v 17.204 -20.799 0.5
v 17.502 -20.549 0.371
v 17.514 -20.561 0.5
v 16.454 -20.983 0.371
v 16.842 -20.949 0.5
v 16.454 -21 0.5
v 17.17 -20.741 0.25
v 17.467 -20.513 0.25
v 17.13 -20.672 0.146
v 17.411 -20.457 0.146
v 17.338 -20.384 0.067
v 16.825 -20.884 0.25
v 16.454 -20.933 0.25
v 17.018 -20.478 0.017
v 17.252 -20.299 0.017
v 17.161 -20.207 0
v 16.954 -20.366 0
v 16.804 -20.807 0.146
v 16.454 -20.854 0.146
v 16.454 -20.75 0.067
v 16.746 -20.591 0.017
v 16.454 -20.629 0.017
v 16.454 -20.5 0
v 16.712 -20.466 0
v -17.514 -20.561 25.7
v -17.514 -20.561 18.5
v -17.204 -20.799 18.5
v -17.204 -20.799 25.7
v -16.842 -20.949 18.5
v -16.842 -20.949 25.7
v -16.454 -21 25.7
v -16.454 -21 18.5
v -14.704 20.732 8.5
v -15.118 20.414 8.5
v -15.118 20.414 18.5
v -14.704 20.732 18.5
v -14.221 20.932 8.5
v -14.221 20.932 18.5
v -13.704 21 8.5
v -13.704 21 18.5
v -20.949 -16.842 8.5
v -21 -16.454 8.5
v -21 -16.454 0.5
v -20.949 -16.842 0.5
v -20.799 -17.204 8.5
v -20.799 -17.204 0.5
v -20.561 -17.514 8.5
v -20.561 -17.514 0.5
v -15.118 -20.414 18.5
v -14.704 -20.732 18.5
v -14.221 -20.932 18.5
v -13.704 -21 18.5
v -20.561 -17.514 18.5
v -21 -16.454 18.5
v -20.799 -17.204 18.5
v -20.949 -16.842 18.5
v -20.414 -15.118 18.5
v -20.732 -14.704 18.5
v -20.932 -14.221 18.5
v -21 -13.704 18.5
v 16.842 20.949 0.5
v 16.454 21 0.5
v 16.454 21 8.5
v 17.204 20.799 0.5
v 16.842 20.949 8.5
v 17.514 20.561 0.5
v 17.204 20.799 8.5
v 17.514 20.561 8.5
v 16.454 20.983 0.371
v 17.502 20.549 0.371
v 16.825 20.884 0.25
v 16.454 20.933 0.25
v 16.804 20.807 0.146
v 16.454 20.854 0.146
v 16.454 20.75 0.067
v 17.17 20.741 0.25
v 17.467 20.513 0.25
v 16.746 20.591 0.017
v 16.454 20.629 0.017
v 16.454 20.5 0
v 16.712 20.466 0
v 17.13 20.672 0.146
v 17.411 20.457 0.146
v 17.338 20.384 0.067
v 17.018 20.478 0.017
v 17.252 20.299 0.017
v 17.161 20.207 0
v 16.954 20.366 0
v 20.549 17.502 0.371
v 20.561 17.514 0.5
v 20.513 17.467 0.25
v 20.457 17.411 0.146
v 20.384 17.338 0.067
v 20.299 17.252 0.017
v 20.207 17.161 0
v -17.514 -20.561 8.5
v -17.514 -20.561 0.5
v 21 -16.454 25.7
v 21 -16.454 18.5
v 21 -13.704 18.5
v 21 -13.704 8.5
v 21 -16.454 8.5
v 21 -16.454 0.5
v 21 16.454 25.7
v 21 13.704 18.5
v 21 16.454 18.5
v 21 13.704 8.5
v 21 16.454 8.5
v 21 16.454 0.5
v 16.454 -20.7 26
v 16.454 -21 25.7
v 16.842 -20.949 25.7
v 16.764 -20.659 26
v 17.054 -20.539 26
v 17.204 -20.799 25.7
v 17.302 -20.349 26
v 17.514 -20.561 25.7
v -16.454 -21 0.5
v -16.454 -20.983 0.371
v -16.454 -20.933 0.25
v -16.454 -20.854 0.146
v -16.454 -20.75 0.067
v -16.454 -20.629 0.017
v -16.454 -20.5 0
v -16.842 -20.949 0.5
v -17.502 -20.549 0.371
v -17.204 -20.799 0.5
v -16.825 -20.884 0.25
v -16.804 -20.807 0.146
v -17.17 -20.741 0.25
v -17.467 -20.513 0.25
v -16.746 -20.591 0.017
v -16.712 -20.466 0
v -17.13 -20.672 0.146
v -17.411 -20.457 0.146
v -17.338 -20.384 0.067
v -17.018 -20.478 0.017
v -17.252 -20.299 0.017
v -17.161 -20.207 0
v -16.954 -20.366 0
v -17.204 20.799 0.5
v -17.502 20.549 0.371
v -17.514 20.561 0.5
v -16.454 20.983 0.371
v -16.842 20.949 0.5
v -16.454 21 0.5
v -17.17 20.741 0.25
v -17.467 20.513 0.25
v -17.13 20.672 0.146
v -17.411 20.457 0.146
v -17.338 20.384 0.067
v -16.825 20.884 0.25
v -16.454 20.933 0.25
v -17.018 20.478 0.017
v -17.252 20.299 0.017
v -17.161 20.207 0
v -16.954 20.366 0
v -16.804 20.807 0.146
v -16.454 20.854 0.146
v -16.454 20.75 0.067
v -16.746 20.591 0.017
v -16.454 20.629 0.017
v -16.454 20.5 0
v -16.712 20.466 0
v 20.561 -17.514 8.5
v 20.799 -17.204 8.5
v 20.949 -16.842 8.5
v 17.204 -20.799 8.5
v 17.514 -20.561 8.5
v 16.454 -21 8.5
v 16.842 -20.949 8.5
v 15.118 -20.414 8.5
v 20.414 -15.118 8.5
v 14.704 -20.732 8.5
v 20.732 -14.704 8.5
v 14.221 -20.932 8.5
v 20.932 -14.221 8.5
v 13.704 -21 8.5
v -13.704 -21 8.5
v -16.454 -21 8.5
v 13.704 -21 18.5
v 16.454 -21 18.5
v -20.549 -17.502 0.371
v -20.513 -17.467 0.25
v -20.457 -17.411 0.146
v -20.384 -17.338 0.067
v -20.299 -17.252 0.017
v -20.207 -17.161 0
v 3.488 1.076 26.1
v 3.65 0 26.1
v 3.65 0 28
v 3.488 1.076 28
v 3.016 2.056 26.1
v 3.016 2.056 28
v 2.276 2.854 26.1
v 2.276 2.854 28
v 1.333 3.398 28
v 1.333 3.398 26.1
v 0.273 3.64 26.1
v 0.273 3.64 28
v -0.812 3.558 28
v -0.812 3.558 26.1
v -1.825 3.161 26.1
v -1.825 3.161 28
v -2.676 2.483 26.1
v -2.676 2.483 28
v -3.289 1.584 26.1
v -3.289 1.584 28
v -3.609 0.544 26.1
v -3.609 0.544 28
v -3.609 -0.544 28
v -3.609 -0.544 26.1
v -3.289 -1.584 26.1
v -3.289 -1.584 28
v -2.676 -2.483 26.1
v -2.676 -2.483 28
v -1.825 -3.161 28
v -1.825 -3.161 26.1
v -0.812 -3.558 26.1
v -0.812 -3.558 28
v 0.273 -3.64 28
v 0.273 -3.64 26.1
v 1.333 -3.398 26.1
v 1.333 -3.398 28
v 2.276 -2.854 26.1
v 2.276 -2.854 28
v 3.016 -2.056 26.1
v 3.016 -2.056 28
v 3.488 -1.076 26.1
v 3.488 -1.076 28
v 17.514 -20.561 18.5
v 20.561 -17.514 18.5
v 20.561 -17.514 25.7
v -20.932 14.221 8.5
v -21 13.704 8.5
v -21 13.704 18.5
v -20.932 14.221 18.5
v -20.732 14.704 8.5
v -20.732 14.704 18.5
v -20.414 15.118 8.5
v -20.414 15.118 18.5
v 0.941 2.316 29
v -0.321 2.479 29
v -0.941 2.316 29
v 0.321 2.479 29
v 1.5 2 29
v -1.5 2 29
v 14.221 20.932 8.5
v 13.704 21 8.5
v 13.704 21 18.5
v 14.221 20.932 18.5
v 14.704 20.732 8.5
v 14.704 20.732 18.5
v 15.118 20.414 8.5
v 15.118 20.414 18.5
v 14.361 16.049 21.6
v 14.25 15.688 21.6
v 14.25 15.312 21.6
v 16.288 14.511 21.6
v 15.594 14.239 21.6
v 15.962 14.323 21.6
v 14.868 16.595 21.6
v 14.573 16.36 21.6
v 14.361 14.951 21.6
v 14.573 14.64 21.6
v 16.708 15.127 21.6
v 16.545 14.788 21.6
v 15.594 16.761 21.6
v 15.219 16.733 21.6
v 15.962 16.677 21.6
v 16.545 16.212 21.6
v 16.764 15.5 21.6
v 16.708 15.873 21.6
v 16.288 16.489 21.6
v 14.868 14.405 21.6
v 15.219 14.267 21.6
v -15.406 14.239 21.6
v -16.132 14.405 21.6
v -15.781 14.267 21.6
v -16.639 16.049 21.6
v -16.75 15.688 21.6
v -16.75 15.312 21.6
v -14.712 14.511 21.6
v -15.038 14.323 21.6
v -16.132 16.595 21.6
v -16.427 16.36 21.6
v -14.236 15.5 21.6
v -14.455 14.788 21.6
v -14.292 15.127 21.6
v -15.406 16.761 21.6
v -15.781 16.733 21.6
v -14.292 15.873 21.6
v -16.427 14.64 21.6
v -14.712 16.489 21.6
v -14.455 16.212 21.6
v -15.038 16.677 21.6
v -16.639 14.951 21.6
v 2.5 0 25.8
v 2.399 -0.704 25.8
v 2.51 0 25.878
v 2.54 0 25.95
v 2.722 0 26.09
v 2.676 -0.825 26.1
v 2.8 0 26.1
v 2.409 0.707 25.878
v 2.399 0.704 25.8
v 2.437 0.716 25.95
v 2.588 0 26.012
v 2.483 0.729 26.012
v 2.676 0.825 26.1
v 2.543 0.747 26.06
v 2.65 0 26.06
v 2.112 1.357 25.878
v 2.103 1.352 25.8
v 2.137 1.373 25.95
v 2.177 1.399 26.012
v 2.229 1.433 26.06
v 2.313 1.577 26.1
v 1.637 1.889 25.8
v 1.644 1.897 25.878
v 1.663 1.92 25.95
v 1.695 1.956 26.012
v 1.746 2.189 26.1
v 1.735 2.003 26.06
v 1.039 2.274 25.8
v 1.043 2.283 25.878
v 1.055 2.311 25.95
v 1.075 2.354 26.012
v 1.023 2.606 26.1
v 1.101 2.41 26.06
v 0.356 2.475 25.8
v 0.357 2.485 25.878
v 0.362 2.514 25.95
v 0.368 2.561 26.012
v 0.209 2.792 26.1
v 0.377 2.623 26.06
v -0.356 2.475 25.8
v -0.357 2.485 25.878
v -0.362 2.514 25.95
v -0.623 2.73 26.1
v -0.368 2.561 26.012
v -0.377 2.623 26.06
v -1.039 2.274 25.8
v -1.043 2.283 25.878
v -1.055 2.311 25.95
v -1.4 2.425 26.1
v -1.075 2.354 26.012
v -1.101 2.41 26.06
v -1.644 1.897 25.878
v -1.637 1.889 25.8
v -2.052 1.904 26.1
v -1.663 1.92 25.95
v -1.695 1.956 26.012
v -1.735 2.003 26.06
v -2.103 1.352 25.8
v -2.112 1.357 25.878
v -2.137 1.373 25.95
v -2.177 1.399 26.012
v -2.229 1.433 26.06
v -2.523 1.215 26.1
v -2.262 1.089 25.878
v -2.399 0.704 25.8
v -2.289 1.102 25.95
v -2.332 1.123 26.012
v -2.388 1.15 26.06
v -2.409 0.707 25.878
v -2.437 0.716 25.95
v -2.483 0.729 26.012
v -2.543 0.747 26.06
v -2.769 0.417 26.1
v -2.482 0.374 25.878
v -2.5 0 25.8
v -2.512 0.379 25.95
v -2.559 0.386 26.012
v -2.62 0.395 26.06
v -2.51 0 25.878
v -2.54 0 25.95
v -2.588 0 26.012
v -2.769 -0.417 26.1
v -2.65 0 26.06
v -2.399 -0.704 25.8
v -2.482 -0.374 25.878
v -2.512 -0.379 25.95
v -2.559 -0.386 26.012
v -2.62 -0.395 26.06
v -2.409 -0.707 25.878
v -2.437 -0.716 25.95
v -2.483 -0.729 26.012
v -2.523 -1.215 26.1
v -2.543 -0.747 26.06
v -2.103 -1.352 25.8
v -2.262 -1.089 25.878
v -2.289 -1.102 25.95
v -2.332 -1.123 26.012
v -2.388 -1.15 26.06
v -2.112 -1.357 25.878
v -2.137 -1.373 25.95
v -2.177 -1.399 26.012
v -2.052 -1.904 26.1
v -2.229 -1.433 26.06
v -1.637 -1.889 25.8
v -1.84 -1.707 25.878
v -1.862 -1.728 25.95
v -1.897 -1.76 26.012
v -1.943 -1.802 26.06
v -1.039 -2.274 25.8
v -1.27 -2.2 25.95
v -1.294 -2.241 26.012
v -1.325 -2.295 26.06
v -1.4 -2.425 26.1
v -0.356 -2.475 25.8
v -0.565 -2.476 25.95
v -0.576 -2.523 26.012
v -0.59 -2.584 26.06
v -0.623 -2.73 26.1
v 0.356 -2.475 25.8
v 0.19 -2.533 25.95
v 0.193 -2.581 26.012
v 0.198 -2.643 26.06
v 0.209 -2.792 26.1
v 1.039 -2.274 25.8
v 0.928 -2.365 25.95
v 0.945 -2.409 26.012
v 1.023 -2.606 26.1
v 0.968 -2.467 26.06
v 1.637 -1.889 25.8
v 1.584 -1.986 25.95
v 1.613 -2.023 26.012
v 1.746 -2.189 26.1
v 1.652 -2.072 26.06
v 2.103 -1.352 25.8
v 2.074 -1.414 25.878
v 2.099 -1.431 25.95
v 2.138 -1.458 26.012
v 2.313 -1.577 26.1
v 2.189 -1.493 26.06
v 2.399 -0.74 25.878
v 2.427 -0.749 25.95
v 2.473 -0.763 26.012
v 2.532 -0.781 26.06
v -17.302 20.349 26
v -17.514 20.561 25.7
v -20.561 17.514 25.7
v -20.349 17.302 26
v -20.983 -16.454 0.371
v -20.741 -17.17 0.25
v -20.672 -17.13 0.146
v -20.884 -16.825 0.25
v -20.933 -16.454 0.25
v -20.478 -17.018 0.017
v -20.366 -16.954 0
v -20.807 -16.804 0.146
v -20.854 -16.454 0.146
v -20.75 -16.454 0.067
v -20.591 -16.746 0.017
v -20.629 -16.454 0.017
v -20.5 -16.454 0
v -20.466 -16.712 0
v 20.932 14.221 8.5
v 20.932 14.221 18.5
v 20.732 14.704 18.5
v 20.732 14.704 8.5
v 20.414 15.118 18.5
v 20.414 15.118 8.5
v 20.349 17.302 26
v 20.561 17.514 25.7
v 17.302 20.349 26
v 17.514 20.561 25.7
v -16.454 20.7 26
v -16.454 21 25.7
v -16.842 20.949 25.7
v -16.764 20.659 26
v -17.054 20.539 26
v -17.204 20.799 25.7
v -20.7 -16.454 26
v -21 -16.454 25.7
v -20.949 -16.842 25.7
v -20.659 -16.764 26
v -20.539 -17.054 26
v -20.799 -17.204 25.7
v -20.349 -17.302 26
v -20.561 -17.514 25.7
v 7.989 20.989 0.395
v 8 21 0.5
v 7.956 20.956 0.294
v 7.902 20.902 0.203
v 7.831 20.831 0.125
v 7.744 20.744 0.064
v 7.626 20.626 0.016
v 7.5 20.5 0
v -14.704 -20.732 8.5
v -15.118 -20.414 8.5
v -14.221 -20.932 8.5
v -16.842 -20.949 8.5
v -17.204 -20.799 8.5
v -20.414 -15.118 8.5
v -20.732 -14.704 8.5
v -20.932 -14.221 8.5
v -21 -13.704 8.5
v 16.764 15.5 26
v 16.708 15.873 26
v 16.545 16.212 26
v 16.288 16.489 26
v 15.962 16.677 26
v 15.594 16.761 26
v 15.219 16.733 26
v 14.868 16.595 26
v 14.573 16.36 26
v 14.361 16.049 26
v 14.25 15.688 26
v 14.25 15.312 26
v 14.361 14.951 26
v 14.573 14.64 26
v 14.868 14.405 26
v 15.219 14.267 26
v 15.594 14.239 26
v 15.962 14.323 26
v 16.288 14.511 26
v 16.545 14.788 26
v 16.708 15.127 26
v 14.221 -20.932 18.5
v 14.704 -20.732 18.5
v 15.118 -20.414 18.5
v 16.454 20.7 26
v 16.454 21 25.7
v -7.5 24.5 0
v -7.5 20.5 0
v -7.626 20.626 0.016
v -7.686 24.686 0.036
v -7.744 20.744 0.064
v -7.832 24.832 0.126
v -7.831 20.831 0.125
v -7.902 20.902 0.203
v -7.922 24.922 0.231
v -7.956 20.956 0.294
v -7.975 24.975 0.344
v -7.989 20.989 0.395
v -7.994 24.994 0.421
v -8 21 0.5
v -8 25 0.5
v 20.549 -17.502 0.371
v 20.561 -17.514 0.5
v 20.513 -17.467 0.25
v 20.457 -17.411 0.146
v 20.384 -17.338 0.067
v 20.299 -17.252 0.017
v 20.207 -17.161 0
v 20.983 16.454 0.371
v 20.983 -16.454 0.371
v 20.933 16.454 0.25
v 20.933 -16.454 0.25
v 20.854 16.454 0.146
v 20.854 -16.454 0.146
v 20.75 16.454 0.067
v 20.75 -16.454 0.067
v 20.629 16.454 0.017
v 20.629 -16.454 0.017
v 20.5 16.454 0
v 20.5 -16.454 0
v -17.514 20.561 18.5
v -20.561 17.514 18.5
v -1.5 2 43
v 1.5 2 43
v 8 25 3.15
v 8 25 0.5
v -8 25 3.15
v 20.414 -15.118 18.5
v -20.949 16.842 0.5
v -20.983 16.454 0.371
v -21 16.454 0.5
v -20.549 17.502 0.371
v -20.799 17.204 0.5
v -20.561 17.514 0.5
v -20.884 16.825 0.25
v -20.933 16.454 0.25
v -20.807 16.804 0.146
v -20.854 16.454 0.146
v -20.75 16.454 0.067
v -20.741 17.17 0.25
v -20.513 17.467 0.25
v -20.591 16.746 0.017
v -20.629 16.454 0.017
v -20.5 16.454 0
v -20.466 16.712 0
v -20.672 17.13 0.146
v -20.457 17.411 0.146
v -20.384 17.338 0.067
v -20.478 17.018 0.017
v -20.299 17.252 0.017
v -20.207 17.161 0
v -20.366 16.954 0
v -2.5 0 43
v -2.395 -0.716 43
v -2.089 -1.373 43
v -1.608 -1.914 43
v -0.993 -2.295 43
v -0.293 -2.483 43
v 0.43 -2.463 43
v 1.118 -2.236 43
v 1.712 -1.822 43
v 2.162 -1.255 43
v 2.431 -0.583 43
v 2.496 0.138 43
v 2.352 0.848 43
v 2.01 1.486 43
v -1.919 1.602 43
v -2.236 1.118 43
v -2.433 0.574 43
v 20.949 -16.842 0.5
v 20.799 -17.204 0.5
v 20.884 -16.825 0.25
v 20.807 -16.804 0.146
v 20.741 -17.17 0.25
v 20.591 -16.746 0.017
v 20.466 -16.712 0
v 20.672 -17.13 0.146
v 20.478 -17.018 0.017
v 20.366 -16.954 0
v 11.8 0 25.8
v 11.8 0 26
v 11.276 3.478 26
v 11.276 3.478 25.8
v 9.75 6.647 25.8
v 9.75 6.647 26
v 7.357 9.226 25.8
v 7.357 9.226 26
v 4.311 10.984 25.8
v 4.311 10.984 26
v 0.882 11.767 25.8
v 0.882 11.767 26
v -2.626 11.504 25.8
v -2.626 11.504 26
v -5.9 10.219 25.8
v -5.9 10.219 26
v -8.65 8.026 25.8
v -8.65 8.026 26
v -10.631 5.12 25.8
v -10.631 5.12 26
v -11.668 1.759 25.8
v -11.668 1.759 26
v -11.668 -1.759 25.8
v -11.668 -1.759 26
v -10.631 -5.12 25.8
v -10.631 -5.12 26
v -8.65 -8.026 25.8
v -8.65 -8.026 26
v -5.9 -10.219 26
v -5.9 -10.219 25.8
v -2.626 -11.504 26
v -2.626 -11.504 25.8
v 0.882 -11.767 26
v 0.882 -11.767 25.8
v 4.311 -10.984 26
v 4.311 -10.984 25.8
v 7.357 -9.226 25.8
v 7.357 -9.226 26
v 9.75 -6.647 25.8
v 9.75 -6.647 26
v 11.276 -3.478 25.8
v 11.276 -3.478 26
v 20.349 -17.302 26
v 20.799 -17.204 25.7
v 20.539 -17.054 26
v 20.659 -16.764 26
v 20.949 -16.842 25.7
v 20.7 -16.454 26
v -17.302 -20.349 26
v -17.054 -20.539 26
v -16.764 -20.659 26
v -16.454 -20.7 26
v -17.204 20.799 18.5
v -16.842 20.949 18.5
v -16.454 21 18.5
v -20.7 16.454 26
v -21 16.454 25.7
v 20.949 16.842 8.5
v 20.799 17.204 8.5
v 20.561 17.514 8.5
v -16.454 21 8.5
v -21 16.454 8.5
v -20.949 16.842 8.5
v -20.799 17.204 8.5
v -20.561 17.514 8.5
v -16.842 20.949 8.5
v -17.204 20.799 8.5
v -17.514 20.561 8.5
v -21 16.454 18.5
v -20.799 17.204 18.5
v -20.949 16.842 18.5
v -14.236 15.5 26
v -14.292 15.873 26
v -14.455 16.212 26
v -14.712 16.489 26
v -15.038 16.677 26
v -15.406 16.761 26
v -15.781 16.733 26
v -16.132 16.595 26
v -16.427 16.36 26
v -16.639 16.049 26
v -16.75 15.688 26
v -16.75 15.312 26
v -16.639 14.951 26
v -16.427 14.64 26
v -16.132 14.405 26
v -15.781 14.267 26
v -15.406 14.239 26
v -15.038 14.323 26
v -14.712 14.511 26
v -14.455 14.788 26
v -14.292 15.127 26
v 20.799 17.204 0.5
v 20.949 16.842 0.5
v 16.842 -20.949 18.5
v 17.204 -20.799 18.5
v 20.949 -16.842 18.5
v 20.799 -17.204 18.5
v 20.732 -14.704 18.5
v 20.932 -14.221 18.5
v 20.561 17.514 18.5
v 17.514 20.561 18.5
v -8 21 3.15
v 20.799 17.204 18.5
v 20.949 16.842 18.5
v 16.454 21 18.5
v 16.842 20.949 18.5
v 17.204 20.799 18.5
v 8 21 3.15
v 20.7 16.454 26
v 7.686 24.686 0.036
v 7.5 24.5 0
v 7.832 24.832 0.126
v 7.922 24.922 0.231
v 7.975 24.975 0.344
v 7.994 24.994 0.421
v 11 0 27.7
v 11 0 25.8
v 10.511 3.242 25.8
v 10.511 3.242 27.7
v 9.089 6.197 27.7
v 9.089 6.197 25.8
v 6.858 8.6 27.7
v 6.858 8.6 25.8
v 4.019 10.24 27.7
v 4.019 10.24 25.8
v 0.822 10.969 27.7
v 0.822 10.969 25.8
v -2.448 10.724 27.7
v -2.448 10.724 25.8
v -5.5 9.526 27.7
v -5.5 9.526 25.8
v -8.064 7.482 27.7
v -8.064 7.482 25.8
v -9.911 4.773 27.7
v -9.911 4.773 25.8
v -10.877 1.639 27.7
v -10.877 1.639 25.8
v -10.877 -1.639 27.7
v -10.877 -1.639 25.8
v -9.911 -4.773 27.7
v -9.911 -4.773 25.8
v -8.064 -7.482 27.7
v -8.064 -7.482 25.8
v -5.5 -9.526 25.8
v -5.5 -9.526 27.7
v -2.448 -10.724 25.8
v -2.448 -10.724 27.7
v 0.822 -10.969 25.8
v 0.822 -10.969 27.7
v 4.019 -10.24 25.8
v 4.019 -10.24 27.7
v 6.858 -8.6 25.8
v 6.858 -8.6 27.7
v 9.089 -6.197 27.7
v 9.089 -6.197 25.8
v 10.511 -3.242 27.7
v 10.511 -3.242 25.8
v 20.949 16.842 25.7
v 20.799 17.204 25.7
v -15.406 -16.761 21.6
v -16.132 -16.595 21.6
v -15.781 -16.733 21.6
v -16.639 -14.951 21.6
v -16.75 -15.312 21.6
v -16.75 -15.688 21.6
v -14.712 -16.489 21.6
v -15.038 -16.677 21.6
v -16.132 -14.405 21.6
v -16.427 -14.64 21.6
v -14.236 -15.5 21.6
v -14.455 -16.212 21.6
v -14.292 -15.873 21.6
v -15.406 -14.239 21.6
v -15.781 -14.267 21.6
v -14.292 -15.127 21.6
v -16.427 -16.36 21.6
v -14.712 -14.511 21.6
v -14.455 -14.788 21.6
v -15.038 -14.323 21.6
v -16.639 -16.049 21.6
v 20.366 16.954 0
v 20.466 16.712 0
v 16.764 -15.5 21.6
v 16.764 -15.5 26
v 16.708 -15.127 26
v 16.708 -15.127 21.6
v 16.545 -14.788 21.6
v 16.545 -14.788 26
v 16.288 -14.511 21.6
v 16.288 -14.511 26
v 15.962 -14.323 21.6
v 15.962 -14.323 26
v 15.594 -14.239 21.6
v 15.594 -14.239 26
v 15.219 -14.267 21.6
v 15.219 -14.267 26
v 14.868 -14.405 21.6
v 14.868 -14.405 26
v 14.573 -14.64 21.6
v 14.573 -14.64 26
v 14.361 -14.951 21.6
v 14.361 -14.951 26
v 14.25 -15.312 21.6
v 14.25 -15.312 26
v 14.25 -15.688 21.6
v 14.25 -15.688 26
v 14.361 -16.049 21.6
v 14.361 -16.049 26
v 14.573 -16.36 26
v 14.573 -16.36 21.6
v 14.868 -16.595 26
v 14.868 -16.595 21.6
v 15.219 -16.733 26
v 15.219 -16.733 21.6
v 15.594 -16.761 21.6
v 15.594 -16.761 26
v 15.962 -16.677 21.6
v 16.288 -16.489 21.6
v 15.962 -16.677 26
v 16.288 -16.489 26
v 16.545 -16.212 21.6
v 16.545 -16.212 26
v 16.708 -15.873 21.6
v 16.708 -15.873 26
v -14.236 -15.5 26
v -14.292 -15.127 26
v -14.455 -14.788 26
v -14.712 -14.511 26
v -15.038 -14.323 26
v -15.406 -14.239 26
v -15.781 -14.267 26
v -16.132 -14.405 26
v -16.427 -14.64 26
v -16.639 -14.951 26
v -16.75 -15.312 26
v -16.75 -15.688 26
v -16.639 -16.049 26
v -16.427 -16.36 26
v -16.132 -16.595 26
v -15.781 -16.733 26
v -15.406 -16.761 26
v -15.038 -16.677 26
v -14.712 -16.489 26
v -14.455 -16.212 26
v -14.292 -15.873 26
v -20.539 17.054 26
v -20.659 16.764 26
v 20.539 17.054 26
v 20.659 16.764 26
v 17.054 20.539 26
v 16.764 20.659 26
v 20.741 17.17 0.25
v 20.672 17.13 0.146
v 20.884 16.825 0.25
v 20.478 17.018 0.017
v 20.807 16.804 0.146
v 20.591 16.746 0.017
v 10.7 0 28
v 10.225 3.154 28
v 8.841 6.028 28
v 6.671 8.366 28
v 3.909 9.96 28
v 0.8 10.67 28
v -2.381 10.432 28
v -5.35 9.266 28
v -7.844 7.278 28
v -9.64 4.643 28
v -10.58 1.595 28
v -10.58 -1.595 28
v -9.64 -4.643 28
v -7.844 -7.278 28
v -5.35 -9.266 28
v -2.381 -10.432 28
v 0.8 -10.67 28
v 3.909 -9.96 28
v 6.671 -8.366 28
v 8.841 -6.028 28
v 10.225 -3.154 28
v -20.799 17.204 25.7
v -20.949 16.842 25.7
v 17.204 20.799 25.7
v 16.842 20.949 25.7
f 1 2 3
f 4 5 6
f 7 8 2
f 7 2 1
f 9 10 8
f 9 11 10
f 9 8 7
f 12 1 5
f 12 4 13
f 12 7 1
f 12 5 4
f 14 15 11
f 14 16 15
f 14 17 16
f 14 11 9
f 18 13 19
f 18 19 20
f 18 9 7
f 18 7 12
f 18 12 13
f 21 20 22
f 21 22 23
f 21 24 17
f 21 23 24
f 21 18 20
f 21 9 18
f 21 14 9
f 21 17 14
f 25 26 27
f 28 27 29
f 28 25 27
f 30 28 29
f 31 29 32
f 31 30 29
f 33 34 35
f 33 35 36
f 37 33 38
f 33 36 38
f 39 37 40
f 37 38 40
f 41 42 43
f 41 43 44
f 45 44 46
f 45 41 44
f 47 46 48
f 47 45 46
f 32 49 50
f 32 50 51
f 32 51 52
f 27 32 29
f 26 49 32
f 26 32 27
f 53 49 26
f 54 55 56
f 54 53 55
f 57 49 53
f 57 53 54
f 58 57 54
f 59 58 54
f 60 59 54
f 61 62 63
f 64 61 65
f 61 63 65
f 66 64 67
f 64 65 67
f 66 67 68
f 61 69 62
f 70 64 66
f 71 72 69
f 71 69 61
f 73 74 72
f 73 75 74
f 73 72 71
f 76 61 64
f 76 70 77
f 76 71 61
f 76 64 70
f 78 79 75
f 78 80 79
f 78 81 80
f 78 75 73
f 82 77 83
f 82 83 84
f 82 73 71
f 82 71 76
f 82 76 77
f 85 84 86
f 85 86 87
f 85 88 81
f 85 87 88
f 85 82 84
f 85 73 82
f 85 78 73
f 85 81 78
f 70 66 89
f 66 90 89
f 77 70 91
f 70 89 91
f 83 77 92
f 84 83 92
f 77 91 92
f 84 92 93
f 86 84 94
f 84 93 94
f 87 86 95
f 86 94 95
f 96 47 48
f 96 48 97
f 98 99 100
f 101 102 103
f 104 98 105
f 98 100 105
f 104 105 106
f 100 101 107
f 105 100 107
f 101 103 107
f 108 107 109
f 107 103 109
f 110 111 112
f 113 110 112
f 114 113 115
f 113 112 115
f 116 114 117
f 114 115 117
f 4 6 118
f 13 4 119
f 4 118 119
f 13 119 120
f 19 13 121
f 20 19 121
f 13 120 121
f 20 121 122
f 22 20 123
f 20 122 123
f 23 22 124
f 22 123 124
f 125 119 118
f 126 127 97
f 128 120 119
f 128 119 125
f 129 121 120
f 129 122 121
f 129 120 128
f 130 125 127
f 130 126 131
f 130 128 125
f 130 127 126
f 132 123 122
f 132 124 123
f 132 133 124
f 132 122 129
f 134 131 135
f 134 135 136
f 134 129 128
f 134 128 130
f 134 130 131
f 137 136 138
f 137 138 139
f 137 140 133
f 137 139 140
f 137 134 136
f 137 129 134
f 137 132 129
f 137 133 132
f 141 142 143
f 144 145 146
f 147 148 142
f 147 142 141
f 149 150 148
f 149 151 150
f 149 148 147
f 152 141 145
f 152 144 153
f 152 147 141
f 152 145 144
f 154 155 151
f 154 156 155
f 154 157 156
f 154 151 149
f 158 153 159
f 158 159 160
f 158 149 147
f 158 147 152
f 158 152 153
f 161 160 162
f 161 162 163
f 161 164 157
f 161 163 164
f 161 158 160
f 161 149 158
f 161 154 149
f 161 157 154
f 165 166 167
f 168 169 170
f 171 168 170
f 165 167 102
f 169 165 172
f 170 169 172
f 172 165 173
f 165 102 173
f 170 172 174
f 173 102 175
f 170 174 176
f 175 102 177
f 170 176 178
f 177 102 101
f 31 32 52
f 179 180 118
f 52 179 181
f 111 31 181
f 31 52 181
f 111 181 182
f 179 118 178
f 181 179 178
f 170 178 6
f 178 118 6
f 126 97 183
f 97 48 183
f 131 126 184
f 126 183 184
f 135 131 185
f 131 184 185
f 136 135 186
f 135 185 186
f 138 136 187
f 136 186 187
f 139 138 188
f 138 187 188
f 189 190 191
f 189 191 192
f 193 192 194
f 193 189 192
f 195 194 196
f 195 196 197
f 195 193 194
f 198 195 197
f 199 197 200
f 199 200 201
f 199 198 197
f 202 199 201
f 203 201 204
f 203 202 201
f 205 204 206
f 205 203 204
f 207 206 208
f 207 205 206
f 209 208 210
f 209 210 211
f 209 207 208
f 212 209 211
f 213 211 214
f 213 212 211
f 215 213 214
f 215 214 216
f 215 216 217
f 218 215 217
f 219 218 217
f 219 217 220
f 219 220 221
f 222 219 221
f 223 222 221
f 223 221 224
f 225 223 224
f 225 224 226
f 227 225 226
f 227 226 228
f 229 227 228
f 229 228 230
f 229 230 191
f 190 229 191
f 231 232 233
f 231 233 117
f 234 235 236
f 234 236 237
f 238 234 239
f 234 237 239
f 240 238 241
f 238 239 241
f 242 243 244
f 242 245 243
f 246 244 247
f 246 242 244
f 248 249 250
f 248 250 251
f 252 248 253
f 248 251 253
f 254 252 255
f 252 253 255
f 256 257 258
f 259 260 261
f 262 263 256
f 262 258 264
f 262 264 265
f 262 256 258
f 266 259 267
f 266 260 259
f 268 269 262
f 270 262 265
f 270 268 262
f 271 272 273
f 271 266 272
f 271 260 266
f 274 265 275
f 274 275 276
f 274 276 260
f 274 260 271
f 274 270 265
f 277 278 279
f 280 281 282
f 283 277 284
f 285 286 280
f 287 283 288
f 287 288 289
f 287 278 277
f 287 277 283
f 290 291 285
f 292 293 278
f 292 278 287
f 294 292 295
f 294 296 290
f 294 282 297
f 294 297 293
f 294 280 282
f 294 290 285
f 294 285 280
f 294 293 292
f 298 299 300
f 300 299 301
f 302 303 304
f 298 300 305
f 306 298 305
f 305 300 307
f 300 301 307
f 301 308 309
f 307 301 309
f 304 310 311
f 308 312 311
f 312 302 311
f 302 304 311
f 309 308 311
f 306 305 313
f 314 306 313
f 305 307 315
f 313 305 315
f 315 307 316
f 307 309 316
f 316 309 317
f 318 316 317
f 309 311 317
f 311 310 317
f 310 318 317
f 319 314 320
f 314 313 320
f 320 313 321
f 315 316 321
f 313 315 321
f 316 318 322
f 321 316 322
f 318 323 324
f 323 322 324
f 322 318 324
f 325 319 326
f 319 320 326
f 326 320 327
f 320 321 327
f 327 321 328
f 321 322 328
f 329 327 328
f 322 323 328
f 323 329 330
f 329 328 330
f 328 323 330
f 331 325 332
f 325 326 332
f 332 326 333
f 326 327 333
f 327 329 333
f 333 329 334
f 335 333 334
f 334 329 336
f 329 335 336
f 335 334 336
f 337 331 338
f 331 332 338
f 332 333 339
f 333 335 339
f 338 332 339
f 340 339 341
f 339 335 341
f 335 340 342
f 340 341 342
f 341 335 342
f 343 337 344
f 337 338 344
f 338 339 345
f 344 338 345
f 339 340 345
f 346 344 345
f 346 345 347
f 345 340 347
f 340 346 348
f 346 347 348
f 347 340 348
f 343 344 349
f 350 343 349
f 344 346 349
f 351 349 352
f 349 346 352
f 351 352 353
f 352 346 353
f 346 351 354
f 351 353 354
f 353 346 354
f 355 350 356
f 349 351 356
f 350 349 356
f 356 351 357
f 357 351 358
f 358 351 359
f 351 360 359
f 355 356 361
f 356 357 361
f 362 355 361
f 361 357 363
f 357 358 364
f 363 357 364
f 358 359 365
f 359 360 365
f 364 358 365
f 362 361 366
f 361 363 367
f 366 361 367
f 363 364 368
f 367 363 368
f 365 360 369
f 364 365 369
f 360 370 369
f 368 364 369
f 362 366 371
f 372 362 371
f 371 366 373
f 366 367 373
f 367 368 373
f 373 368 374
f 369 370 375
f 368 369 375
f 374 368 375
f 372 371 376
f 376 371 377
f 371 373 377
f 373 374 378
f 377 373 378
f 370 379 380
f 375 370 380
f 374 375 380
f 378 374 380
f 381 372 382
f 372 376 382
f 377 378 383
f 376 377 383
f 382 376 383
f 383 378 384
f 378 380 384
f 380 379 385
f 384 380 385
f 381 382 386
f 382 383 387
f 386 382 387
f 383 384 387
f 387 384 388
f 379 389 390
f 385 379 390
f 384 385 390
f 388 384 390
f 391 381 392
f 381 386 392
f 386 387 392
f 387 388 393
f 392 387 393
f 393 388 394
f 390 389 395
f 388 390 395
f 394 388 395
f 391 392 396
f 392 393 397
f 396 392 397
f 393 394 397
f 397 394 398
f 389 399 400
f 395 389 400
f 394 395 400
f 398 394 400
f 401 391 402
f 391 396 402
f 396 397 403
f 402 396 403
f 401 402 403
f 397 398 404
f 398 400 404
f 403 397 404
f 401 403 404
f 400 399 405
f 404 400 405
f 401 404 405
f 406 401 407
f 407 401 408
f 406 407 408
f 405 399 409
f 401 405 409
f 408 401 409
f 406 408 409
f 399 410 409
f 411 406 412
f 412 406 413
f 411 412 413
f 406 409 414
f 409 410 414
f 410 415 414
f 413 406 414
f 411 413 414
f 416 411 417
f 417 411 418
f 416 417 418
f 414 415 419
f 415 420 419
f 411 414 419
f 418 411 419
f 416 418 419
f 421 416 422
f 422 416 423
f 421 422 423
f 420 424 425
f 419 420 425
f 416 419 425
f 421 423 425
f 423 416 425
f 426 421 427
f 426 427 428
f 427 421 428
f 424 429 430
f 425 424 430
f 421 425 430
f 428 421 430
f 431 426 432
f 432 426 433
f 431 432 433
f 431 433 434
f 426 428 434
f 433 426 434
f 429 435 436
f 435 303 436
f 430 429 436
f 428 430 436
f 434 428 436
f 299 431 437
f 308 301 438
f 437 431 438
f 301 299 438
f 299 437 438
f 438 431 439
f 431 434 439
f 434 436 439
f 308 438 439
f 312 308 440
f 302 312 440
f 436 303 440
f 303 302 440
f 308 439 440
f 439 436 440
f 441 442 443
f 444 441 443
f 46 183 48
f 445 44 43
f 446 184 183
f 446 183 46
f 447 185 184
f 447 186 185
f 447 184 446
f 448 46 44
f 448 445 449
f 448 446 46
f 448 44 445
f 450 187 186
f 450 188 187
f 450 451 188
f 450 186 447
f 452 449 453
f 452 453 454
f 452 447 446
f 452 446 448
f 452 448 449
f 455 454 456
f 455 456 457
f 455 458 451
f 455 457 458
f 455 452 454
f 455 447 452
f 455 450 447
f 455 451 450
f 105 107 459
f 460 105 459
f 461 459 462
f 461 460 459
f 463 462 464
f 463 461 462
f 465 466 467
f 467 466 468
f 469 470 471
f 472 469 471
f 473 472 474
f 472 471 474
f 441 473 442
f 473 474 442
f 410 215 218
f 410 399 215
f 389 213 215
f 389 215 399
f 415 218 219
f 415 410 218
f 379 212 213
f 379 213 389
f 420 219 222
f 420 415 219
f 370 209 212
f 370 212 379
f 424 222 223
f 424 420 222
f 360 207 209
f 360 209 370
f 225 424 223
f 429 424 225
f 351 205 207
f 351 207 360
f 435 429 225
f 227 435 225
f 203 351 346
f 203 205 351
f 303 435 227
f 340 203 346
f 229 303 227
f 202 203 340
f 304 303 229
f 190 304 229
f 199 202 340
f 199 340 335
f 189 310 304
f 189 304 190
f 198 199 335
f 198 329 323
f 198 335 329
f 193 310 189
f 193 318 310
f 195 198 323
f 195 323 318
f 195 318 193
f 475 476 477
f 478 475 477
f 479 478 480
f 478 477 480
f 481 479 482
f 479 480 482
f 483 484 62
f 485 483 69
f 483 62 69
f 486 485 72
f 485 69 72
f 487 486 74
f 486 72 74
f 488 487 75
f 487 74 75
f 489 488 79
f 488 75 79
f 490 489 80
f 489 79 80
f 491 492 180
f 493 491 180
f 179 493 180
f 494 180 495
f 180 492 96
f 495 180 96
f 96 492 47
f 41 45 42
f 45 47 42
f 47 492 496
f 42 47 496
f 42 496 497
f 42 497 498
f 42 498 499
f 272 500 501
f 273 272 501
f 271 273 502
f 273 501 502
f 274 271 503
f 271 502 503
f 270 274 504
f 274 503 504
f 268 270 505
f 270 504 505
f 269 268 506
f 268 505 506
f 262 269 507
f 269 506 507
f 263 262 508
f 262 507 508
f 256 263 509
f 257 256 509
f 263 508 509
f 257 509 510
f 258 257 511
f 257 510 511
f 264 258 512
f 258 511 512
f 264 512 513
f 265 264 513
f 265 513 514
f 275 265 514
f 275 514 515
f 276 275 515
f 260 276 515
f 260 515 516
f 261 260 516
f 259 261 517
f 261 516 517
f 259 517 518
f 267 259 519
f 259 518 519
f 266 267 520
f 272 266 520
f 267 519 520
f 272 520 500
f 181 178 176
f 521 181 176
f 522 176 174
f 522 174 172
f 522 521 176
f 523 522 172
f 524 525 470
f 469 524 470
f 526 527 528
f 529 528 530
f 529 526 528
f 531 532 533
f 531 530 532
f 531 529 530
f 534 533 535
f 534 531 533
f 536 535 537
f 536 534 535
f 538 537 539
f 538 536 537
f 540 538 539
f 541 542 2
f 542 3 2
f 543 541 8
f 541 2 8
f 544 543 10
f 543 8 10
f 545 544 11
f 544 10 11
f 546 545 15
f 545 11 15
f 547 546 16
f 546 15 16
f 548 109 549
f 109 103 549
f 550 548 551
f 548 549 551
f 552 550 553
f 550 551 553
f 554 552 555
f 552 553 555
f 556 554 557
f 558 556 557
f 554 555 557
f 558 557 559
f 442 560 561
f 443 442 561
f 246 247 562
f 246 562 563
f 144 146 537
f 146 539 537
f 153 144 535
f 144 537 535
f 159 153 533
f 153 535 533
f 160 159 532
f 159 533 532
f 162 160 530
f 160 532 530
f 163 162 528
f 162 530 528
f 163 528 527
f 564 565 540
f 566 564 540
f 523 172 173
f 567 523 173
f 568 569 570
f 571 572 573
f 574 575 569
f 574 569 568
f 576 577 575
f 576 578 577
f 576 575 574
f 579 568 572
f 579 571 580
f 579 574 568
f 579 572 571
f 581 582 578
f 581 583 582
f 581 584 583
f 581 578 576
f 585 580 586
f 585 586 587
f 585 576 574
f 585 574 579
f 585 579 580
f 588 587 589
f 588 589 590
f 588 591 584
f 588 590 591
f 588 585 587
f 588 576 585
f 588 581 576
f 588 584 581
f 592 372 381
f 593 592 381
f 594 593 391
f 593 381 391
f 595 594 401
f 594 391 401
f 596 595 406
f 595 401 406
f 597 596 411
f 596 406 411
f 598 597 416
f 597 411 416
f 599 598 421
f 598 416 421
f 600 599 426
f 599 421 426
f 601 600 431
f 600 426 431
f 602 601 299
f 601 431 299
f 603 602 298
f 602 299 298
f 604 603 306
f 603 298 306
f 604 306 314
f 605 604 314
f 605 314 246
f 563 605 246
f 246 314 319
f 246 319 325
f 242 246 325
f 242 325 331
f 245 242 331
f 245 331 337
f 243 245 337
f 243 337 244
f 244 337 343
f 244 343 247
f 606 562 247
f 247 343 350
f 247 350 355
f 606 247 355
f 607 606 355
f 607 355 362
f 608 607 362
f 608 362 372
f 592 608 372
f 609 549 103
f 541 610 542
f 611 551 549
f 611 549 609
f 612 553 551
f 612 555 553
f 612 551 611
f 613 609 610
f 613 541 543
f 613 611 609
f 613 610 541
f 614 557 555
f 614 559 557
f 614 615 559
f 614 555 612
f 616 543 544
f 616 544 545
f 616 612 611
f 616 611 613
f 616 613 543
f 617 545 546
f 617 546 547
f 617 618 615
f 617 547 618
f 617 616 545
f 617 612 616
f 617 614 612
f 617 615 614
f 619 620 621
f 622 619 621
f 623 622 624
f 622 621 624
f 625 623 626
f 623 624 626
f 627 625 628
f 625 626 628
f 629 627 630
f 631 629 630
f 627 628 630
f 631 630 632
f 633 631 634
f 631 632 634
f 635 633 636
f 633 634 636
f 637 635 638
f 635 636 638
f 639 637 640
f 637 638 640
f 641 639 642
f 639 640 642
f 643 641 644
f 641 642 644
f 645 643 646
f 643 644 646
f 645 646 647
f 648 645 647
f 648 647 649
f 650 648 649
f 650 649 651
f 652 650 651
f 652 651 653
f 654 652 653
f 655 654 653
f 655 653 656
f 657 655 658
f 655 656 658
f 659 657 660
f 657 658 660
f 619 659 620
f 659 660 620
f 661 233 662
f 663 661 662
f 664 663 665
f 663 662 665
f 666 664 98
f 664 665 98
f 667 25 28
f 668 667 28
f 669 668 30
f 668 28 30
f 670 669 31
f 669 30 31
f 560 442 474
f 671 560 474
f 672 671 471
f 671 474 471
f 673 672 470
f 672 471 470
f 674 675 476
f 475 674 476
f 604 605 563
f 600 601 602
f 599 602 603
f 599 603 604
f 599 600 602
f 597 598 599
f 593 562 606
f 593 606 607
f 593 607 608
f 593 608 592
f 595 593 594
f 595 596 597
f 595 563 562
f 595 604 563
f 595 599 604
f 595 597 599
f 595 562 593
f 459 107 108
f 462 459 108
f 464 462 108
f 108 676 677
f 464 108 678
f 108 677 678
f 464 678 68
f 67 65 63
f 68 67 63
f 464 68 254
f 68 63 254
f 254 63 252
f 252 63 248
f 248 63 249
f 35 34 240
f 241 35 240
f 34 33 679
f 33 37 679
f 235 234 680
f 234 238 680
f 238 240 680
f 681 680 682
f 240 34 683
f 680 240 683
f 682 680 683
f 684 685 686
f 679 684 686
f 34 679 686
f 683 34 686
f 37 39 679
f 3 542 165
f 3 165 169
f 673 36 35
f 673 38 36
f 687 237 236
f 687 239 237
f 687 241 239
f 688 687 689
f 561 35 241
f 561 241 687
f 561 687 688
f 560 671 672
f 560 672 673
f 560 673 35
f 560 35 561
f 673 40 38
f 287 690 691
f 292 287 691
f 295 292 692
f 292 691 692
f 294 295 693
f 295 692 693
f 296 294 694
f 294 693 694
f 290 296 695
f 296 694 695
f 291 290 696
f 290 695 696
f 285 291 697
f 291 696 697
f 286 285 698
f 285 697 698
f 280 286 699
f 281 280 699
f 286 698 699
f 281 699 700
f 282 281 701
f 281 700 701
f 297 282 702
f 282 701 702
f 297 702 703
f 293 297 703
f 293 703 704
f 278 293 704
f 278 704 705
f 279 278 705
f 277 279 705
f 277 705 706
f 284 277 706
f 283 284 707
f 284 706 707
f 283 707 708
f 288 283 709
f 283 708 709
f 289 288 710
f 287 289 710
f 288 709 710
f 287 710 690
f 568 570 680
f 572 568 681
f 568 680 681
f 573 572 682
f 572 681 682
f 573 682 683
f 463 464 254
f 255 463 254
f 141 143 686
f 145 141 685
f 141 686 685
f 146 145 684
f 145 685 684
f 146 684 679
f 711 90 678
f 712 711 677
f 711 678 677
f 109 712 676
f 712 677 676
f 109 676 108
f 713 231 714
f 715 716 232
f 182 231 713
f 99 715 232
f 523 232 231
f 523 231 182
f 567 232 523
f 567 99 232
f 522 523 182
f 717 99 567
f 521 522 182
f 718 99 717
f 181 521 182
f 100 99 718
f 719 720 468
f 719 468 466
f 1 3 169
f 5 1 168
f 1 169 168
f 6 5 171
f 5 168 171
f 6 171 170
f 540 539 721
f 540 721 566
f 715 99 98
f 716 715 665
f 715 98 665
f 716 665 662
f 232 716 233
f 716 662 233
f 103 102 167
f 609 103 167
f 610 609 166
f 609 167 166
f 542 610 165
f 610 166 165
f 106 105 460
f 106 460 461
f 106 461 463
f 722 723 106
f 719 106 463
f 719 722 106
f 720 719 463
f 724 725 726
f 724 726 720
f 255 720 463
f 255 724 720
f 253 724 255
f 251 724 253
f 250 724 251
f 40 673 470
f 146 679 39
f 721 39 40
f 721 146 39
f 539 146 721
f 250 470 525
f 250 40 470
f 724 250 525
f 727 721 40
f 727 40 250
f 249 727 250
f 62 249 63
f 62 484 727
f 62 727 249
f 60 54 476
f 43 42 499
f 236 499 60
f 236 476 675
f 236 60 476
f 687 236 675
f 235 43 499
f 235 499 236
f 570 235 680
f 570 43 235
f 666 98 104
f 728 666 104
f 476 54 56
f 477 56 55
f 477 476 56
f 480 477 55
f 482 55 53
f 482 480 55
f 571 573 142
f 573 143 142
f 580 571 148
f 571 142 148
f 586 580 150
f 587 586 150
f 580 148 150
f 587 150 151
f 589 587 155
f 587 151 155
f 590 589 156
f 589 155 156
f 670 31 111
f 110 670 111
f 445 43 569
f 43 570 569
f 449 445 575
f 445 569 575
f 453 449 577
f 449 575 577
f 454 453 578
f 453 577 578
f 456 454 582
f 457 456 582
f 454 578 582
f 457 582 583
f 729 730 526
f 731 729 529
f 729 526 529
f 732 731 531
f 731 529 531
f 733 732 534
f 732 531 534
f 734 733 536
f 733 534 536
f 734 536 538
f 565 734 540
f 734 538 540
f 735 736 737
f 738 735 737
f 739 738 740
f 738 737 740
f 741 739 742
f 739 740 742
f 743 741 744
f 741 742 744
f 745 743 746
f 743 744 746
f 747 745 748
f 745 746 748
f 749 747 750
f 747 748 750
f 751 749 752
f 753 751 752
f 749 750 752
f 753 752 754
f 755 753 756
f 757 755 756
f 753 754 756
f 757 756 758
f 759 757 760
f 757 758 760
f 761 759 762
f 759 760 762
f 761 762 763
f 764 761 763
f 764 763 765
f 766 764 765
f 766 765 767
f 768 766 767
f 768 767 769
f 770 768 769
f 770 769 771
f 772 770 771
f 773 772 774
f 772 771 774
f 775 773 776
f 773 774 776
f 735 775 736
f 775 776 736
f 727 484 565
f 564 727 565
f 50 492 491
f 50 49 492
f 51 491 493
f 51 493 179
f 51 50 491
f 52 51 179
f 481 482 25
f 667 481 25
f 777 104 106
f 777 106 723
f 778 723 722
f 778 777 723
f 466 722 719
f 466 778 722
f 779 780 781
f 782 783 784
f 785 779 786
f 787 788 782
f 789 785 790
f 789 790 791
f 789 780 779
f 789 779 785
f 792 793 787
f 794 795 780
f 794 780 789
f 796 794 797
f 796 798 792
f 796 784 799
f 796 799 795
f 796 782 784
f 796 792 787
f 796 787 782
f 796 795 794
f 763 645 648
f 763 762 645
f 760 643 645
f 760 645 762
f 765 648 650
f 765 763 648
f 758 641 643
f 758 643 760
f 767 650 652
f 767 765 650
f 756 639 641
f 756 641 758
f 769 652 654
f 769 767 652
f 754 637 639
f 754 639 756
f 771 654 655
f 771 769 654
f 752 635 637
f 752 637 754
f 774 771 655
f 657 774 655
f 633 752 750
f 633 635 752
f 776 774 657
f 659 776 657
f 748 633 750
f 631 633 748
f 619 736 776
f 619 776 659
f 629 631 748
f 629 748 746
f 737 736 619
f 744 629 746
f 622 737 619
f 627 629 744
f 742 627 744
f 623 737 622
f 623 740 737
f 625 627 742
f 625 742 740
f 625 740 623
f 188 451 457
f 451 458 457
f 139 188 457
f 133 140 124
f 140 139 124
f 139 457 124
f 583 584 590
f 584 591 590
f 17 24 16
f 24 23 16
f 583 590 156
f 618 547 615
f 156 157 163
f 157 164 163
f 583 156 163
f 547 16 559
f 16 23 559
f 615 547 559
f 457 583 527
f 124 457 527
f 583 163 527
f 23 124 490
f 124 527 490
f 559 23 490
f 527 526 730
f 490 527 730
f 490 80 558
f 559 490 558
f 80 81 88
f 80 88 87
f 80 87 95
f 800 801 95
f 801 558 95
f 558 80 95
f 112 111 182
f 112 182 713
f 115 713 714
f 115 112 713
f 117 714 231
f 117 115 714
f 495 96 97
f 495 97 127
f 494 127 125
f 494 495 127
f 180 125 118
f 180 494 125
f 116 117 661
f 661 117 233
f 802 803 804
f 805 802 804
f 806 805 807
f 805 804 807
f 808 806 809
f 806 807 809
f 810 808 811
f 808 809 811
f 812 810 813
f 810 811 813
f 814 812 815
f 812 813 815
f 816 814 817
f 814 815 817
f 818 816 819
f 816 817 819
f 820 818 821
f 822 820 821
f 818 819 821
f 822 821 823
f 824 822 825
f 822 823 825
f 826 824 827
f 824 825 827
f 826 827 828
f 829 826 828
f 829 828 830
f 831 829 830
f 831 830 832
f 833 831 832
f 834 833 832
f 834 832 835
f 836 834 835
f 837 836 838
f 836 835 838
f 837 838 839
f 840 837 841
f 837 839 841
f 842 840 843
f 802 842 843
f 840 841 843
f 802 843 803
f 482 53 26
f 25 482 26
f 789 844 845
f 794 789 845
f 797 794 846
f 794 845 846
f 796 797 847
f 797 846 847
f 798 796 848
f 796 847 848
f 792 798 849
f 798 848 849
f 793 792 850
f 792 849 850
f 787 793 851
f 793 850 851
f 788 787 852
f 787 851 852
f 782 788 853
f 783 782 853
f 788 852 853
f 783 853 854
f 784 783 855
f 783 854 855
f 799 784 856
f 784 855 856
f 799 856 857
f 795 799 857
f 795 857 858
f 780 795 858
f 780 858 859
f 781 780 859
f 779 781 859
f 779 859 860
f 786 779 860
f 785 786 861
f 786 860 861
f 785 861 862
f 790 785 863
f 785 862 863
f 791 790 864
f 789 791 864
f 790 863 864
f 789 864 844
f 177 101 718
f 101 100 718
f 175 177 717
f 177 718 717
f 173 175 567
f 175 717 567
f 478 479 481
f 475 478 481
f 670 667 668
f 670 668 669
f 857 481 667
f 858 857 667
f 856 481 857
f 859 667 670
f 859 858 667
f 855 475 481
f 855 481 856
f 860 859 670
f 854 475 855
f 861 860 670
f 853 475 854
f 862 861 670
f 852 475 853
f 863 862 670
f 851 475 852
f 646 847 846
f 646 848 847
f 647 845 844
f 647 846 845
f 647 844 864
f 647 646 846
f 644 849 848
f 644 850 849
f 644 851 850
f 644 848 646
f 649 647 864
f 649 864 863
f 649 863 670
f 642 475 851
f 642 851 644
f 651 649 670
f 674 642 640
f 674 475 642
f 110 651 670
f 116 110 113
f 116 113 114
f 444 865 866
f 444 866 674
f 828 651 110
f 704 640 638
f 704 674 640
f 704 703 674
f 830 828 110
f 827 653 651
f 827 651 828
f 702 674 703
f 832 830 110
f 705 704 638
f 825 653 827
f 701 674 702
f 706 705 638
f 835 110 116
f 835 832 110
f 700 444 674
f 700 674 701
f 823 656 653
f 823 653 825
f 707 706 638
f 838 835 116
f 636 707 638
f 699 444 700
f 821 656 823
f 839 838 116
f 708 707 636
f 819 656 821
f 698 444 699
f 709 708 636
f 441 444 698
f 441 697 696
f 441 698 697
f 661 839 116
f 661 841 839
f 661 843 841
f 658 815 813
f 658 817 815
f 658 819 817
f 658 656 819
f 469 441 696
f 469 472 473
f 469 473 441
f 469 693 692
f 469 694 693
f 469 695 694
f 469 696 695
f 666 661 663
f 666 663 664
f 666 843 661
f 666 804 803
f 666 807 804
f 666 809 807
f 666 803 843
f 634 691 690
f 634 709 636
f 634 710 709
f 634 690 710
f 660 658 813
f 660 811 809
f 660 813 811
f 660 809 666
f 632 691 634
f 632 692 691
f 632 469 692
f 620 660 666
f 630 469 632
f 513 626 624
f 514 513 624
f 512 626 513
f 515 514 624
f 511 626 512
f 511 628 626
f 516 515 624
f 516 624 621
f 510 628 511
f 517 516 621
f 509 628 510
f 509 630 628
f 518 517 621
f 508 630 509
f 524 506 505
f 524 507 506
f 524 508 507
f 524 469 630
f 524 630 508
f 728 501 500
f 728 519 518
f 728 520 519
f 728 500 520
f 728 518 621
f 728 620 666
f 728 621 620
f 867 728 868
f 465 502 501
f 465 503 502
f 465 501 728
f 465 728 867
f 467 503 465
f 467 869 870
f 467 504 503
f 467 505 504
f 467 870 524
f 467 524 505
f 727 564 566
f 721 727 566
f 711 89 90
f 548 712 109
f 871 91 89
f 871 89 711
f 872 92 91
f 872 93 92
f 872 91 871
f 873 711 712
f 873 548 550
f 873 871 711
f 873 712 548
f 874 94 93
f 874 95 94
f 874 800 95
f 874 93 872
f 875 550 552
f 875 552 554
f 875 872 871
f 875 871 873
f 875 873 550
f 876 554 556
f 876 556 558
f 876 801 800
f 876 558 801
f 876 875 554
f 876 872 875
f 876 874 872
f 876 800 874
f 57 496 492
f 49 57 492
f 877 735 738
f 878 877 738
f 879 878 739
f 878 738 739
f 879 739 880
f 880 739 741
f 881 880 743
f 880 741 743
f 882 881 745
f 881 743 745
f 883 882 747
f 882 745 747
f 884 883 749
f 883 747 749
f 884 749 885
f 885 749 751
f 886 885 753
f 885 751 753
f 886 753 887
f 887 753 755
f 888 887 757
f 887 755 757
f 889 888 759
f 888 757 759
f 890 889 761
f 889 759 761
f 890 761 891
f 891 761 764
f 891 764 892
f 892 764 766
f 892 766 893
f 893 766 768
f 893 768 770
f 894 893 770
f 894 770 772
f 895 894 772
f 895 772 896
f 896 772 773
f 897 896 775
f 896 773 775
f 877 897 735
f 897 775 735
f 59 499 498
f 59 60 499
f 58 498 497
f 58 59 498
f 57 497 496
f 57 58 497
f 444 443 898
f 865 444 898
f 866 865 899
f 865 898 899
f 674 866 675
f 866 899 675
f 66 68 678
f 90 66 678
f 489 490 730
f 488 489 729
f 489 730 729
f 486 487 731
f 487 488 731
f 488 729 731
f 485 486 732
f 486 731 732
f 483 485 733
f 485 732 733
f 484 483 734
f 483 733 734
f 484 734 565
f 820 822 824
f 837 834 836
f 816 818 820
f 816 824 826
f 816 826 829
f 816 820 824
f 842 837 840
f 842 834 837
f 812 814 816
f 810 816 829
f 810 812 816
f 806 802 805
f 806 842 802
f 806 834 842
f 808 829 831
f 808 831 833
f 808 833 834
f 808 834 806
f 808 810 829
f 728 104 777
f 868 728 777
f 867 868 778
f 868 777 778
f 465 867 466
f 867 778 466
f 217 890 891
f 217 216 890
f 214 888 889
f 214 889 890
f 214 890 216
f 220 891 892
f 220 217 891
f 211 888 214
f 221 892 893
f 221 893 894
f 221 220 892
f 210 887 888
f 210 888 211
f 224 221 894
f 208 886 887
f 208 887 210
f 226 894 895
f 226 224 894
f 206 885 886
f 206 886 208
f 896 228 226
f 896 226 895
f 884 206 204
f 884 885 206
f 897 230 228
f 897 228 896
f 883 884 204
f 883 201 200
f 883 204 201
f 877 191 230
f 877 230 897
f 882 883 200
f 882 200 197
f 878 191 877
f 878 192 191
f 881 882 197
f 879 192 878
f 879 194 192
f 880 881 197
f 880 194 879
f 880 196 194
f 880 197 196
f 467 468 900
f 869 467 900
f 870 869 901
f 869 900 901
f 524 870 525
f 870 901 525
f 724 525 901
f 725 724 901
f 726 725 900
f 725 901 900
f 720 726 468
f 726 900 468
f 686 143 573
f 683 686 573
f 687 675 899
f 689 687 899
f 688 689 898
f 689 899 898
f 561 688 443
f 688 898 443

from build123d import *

# Parameters (mm, degrees)
SKETCH_1_W               = 42
SKETCH_1_H               = 42
EXTRUDE_1_DEPTH          = 26
SKETCH_2_W               = 16
SKETCH_2_H               = 4
EXTRUDE_2_DEPTH          = 3.15
CUT_EXTRUDE_1_REACH      = 43.737
CUT_EXTRUDE_START        = -8.5
CUT_EXTRUDE_2_DEPTH      = 10
FILLET_2_R               = 1.5
FILLET_3_R               = 2
SKETCH_10_R              = 11.8
CUT_EXTRUDE_5_DEPTH      = 0.2
SKETCH_11_R              = 11
SKETCH_11_R_2            = 3.65
EXTRUDE_7_DEPTH          = 2.2
SKETCH_12_R              = 3.65
SKETCH_12_R_2            = 2.5
EXTRUDE_8_DEPTH          = 0.3
FILLET_4_R               = 0.3
SKETCH_13_R              = 2.5
EXTRUDE_9_DEPTH          = 17.2
CUT_EXTRUDE_6_DEPTH      = 54.990739947
CUT_EXTRUDE_6_DEPTH_BACK = 14
SKETCH_15_R              = 1.2645
CUT_EXTRUDE_7_DEPTH      = 4.4
CHAMFER_4_SIZE           = 0.3
CHAMFER_5_SIZE           = 0.3
FILLET_5_R               = 0.5


with BuildPart() as part:
    # 草图1 → 凸台-拉伸1 (new body)
    with BuildSketch(Plane.XY):
        Rectangle(SKETCH_1_W, SKETCH_1_H)
    extrude(amount=EXTRUDE_1_DEPTH)

    # 草图2 → 凸台-拉伸2 (add)
    with BuildSketch(Plane(origin=(0, 0, 0), x_dir=(-1, 0, 0), z_dir=(0, 0, -1))):
        with Locations((0, 23)):
            Rectangle(SKETCH_2_W, SKETCH_2_H)
    extrude(amount=-EXTRUDE_2_DEPTH)

    # 草图3 → 切除-拉伸1 (cut, up to next)
    with BuildSketch(Plane(origin=(0, 0, 0), x_dir=(-1, 0, 0), z_dir=(0, 0, -1)), mode=Mode.PRIVATE) as cut_extrude_1_sk1:
        Polygon((-17.075, 21), (-21, 17.075), (-21, 21), align=None)
    cut_extrude_1_tool1 = extrude(cut_extrude_1_sk1.sketch, amount=-CUT_EXTRUDE_1_REACH, mode=Mode.PRIVATE) & part.part
    # 草图3 → 切除-拉伸1 (cut, up to next)
    with BuildSketch(Plane(origin=(0, 0, 0), x_dir=(-1, 0, 0), z_dir=(0, 0, -1)), mode=Mode.PRIVATE) as cut_extrude_1_sk2:
        Polygon((17.075, 21), (21, 17.075), (21, 21), align=None)
    cut_extrude_1_tool2 = extrude(cut_extrude_1_sk2.sketch, amount=-CUT_EXTRUDE_1_REACH, mode=Mode.PRIVATE) & part.part
    # 草图3 → 切除-拉伸1 (cut, up to next)
    with BuildSketch(Plane(origin=(0, 0, 0), x_dir=(-1, 0, 0), z_dir=(0, 0, -1)), mode=Mode.PRIVATE) as cut_extrude_1_sk3:
        Polygon((21, -17.075), (17.075, -21), (21, -21), align=None)
    cut_extrude_1_tool3 = extrude(cut_extrude_1_sk3.sketch, amount=-CUT_EXTRUDE_1_REACH, mode=Mode.PRIVATE) & part.part
    # 草图3 → 切除-拉伸1 (cut, up to next)
    with BuildSketch(Plane(origin=(0, 0, 0), x_dir=(-1, 0, 0), z_dir=(0, 0, -1)), mode=Mode.PRIVATE) as cut_extrude_1_sk4:
        Polygon((-21, -17.075), (-17.075, -21), (-21, -21), align=None)
    cut_extrude_1_tool4 = extrude(cut_extrude_1_sk4.sketch, amount=-CUT_EXTRUDE_1_REACH, mode=Mode.PRIVATE) & part.part
    add(cut_extrude_1_tool1.solids().sort_by_distance((19.691667, 19.691667, 0))[0], mode=Mode.SUBTRACT)
    add(cut_extrude_1_tool2.solids().sort_by_distance((-19.691667, 19.691667, 0))[0], mode=Mode.SUBTRACT)
    add(cut_extrude_1_tool3.solids().sort_by_distance((-19.691667, -19.691667, 0))[0], mode=Mode.SUBTRACT)
    add(cut_extrude_1_tool4.solids().sort_by_distance((19.691667, -19.691667, 0))[0], mode=Mode.SUBTRACT)

    # 草图4 → 切除-拉伸2 (cut)
    with BuildSketch(Plane(origin=(0, 0, 0), x_dir=(-1, 0, 0), z_dir=(0, 0, -1)).offset(CUT_EXTRUDE_START)):
        Polygon((-21, 14.532), (-14.532, 21), (-21, 21), align=None)
        Polygon((14.532, 21), (21, 14.532), (21, 21), align=None)
        Polygon((21, -14.532), (14.532, -21), (21, -21), align=None)
        Polygon((-14.532, -21), (-21, -14.532), (-21, -21), align=None)
    extrude(amount=-CUT_EXTRUDE_2_DEPTH, mode=Mode.SUBTRACT)

    # 圆角2
    fillet_2_edges = [part.edges().sort_by_distance(p)[0] for p in [
        (21, -17.075, 22.25),
        (17.075, -21, 22.25),
        (-21, -17.075, 22.25),
        (-17.075, -21, 22.25),
        (-17.075, 21, 22.25),
        (-21, 17.075, 22.25),
        (17.075, 21, 22.25),
        (21, 17.075, 22.25),
        (17.075, -21, 4.25),
        (21, -17.075, 4.25),
        (-21, -17.075, 4.25),
        (-17.075, -21, 4.25),
        (-17.075, 21, 4.25),
        (-21, 17.075, 4.25),
        (21, 17.075, 4.25),
        (17.075, 21, 4.25),
    ]]
    fillet(fillet_2_edges, radius=FILLET_2_R)

    # 圆角3
    fillet_3_edges = [part.edges().sort_by_distance(p)[0] for p in [
        (-21, -14.532, 13.5),
        (-14.532, -21, 13.5),
        (-14.532, 21, 13.5),
        (-21, 14.532, 13.5),
        (21, 14.532, 13.5),
        (14.532, 21, 13.5),
        (14.532, -21, 13.5),
        (21, -14.532, 13.5),
    ]]
    fillet(fillet_3_edges, radius=FILLET_3_R)

    # 草图10 → 切除-拉伸5 (cut)
    with BuildSketch(Plane.XY.offset(26)):
        Circle(SKETCH_10_R)
    extrude(amount=-CUT_EXTRUDE_5_DEPTH, mode=Mode.SUBTRACT)

    # 草图11 → 凸台-拉伸7 (add)
    with BuildSketch(Plane.XY.offset(25.8)):
        Circle(SKETCH_11_R)
        Circle(SKETCH_11_R_2, mode=Mode.SUBTRACT)
    extrude(amount=EXTRUDE_7_DEPTH)

    # 草图12 → 凸台-拉伸8 (add)
    with BuildSketch(Plane.XY.offset(25.8)):
        Circle(SKETCH_12_R)
        Circle(SKETCH_12_R_2, mode=Mode.SUBTRACT)
    extrude(amount=EXTRUDE_8_DEPTH)

    # 圆角4
    fillet_4_edges = [part.edges().sort_by_distance(p)[0] for p in [
        (-2.5, 0, 26.1),
    ]]
    fillet(fillet_4_edges, radius=FILLET_4_R - 0.0001)  # a hair under: the kernel refuses the full size

    # 草图13 → 凸台-拉伸9 (add)
    with BuildSketch(Plane.XY.offset(25.8)):
        with Locations(Location((0, 0, 0), (0, 0, 180))):
            Circle(SKETCH_13_R)
    extrude(amount=EXTRUDE_9_DEPTH)

    # 草图14 → 切除-拉伸6 (cut, two sides: drawn at the far end of the back side and taken through both)
    with BuildSketch(Plane.XY.offset(43).offset(-CUT_EXTRUDE_6_DEPTH_BACK)):
        Polygon((-75.850602173, 2), (-1.5, 2), (1.5, 2), (75.850602173, 2), (75.850602173, 150.701204346), (-75.850602173, 150.701204346), align=None)
    extrude(amount=CUT_EXTRUDE_6_DEPTH + CUT_EXTRUDE_6_DEPTH_BACK, mode=Mode.SUBTRACT)

    # 草图15 → 切除-拉伸7 (cut)
    with BuildSketch(Plane.XY.offset(26)):
        with Locations((-15.5, 15.5)):
            Circle(SKETCH_15_R)
        with Locations((15.5, 15.5)):
            Circle(SKETCH_15_R)
        with Locations((15.5, -15.5)):
            Circle(SKETCH_15_R)
        with Locations((-15.5, -15.5)):
            Circle(SKETCH_15_R)
    extrude(amount=-CUT_EXTRUDE_7_DEPTH, mode=Mode.SUBTRACT)

    # 倒角4
    chamfer_4_edges = [part.edges().sort_by_distance(p)[0] for p in [
        (-11, 0, 28),
    ]]
    chamfer(chamfer_4_edges, length=CHAMFER_4_SIZE)

    # 倒角5
    chamfer_5_edges = [part.edges().sort_by_distance(p)[0] for p in [
        (-19.0375, -19.0375, 26),
        (-21, 0, 26),
        (19.0375, -19.0375, 26),
        (21, 0, 26),
        (19.0375, 19.0375, 26),
        (0, 21, 26),
        (-19.0375, 19.0375, 26),
        (0, -21, 26),
        (17.027704805, 20.885819299, 26),
        (20.885819299, 17.027704805, 26),
        (20.885819299, -17.027704805, 26),
        (17.027704805, -20.885819299, 26),
        (-17.027704805, 20.885819299, 26),
        (-20.885819299, 17.027704805, 26),
        (-17.027704805, -20.885819299, 26),
        (-20.885819299, -17.027704805, 26),
    ]]
    chamfer(chamfer_5_edges, length=CHAMFER_5_SIZE)

    # 圆角5
    fillet_5_edges = [part.edges().sort_by_distance(p)[0] for p in [
        (-21, 0, 0),
        (-12.226839828, 21, 0),
        (0, -21, 0),
        (21, 0, 0),
        (19.0375, -19.0375, 0),
        (-19.0375, -19.0375, 0),
        (-19.0375, 19.0375, 0),
        (12.226839828, 21, 0),
        (19.0375, 19.0375, 0),
        (17.027704805, 20.885819299, 0),
        (20.885819299, 17.027704805, 0),
        (20.885819299, -17.027704805, 0),
        (17.027704805, -20.885819299, 0),
        (-20.885819299, 17.027704805, 0),
        (-17.027704805, 20.885819299, 0),
        (-20.885819299, -17.027704805, 0),
        (-17.027704805, -20.885819299, 0),
        (-8, 23, 0),
        (0, 25, 0),
        (8, 23, 0),
    ]]
    fillet(fillet_5_edges, radius=FILLET_5_R)


solid = part.part
